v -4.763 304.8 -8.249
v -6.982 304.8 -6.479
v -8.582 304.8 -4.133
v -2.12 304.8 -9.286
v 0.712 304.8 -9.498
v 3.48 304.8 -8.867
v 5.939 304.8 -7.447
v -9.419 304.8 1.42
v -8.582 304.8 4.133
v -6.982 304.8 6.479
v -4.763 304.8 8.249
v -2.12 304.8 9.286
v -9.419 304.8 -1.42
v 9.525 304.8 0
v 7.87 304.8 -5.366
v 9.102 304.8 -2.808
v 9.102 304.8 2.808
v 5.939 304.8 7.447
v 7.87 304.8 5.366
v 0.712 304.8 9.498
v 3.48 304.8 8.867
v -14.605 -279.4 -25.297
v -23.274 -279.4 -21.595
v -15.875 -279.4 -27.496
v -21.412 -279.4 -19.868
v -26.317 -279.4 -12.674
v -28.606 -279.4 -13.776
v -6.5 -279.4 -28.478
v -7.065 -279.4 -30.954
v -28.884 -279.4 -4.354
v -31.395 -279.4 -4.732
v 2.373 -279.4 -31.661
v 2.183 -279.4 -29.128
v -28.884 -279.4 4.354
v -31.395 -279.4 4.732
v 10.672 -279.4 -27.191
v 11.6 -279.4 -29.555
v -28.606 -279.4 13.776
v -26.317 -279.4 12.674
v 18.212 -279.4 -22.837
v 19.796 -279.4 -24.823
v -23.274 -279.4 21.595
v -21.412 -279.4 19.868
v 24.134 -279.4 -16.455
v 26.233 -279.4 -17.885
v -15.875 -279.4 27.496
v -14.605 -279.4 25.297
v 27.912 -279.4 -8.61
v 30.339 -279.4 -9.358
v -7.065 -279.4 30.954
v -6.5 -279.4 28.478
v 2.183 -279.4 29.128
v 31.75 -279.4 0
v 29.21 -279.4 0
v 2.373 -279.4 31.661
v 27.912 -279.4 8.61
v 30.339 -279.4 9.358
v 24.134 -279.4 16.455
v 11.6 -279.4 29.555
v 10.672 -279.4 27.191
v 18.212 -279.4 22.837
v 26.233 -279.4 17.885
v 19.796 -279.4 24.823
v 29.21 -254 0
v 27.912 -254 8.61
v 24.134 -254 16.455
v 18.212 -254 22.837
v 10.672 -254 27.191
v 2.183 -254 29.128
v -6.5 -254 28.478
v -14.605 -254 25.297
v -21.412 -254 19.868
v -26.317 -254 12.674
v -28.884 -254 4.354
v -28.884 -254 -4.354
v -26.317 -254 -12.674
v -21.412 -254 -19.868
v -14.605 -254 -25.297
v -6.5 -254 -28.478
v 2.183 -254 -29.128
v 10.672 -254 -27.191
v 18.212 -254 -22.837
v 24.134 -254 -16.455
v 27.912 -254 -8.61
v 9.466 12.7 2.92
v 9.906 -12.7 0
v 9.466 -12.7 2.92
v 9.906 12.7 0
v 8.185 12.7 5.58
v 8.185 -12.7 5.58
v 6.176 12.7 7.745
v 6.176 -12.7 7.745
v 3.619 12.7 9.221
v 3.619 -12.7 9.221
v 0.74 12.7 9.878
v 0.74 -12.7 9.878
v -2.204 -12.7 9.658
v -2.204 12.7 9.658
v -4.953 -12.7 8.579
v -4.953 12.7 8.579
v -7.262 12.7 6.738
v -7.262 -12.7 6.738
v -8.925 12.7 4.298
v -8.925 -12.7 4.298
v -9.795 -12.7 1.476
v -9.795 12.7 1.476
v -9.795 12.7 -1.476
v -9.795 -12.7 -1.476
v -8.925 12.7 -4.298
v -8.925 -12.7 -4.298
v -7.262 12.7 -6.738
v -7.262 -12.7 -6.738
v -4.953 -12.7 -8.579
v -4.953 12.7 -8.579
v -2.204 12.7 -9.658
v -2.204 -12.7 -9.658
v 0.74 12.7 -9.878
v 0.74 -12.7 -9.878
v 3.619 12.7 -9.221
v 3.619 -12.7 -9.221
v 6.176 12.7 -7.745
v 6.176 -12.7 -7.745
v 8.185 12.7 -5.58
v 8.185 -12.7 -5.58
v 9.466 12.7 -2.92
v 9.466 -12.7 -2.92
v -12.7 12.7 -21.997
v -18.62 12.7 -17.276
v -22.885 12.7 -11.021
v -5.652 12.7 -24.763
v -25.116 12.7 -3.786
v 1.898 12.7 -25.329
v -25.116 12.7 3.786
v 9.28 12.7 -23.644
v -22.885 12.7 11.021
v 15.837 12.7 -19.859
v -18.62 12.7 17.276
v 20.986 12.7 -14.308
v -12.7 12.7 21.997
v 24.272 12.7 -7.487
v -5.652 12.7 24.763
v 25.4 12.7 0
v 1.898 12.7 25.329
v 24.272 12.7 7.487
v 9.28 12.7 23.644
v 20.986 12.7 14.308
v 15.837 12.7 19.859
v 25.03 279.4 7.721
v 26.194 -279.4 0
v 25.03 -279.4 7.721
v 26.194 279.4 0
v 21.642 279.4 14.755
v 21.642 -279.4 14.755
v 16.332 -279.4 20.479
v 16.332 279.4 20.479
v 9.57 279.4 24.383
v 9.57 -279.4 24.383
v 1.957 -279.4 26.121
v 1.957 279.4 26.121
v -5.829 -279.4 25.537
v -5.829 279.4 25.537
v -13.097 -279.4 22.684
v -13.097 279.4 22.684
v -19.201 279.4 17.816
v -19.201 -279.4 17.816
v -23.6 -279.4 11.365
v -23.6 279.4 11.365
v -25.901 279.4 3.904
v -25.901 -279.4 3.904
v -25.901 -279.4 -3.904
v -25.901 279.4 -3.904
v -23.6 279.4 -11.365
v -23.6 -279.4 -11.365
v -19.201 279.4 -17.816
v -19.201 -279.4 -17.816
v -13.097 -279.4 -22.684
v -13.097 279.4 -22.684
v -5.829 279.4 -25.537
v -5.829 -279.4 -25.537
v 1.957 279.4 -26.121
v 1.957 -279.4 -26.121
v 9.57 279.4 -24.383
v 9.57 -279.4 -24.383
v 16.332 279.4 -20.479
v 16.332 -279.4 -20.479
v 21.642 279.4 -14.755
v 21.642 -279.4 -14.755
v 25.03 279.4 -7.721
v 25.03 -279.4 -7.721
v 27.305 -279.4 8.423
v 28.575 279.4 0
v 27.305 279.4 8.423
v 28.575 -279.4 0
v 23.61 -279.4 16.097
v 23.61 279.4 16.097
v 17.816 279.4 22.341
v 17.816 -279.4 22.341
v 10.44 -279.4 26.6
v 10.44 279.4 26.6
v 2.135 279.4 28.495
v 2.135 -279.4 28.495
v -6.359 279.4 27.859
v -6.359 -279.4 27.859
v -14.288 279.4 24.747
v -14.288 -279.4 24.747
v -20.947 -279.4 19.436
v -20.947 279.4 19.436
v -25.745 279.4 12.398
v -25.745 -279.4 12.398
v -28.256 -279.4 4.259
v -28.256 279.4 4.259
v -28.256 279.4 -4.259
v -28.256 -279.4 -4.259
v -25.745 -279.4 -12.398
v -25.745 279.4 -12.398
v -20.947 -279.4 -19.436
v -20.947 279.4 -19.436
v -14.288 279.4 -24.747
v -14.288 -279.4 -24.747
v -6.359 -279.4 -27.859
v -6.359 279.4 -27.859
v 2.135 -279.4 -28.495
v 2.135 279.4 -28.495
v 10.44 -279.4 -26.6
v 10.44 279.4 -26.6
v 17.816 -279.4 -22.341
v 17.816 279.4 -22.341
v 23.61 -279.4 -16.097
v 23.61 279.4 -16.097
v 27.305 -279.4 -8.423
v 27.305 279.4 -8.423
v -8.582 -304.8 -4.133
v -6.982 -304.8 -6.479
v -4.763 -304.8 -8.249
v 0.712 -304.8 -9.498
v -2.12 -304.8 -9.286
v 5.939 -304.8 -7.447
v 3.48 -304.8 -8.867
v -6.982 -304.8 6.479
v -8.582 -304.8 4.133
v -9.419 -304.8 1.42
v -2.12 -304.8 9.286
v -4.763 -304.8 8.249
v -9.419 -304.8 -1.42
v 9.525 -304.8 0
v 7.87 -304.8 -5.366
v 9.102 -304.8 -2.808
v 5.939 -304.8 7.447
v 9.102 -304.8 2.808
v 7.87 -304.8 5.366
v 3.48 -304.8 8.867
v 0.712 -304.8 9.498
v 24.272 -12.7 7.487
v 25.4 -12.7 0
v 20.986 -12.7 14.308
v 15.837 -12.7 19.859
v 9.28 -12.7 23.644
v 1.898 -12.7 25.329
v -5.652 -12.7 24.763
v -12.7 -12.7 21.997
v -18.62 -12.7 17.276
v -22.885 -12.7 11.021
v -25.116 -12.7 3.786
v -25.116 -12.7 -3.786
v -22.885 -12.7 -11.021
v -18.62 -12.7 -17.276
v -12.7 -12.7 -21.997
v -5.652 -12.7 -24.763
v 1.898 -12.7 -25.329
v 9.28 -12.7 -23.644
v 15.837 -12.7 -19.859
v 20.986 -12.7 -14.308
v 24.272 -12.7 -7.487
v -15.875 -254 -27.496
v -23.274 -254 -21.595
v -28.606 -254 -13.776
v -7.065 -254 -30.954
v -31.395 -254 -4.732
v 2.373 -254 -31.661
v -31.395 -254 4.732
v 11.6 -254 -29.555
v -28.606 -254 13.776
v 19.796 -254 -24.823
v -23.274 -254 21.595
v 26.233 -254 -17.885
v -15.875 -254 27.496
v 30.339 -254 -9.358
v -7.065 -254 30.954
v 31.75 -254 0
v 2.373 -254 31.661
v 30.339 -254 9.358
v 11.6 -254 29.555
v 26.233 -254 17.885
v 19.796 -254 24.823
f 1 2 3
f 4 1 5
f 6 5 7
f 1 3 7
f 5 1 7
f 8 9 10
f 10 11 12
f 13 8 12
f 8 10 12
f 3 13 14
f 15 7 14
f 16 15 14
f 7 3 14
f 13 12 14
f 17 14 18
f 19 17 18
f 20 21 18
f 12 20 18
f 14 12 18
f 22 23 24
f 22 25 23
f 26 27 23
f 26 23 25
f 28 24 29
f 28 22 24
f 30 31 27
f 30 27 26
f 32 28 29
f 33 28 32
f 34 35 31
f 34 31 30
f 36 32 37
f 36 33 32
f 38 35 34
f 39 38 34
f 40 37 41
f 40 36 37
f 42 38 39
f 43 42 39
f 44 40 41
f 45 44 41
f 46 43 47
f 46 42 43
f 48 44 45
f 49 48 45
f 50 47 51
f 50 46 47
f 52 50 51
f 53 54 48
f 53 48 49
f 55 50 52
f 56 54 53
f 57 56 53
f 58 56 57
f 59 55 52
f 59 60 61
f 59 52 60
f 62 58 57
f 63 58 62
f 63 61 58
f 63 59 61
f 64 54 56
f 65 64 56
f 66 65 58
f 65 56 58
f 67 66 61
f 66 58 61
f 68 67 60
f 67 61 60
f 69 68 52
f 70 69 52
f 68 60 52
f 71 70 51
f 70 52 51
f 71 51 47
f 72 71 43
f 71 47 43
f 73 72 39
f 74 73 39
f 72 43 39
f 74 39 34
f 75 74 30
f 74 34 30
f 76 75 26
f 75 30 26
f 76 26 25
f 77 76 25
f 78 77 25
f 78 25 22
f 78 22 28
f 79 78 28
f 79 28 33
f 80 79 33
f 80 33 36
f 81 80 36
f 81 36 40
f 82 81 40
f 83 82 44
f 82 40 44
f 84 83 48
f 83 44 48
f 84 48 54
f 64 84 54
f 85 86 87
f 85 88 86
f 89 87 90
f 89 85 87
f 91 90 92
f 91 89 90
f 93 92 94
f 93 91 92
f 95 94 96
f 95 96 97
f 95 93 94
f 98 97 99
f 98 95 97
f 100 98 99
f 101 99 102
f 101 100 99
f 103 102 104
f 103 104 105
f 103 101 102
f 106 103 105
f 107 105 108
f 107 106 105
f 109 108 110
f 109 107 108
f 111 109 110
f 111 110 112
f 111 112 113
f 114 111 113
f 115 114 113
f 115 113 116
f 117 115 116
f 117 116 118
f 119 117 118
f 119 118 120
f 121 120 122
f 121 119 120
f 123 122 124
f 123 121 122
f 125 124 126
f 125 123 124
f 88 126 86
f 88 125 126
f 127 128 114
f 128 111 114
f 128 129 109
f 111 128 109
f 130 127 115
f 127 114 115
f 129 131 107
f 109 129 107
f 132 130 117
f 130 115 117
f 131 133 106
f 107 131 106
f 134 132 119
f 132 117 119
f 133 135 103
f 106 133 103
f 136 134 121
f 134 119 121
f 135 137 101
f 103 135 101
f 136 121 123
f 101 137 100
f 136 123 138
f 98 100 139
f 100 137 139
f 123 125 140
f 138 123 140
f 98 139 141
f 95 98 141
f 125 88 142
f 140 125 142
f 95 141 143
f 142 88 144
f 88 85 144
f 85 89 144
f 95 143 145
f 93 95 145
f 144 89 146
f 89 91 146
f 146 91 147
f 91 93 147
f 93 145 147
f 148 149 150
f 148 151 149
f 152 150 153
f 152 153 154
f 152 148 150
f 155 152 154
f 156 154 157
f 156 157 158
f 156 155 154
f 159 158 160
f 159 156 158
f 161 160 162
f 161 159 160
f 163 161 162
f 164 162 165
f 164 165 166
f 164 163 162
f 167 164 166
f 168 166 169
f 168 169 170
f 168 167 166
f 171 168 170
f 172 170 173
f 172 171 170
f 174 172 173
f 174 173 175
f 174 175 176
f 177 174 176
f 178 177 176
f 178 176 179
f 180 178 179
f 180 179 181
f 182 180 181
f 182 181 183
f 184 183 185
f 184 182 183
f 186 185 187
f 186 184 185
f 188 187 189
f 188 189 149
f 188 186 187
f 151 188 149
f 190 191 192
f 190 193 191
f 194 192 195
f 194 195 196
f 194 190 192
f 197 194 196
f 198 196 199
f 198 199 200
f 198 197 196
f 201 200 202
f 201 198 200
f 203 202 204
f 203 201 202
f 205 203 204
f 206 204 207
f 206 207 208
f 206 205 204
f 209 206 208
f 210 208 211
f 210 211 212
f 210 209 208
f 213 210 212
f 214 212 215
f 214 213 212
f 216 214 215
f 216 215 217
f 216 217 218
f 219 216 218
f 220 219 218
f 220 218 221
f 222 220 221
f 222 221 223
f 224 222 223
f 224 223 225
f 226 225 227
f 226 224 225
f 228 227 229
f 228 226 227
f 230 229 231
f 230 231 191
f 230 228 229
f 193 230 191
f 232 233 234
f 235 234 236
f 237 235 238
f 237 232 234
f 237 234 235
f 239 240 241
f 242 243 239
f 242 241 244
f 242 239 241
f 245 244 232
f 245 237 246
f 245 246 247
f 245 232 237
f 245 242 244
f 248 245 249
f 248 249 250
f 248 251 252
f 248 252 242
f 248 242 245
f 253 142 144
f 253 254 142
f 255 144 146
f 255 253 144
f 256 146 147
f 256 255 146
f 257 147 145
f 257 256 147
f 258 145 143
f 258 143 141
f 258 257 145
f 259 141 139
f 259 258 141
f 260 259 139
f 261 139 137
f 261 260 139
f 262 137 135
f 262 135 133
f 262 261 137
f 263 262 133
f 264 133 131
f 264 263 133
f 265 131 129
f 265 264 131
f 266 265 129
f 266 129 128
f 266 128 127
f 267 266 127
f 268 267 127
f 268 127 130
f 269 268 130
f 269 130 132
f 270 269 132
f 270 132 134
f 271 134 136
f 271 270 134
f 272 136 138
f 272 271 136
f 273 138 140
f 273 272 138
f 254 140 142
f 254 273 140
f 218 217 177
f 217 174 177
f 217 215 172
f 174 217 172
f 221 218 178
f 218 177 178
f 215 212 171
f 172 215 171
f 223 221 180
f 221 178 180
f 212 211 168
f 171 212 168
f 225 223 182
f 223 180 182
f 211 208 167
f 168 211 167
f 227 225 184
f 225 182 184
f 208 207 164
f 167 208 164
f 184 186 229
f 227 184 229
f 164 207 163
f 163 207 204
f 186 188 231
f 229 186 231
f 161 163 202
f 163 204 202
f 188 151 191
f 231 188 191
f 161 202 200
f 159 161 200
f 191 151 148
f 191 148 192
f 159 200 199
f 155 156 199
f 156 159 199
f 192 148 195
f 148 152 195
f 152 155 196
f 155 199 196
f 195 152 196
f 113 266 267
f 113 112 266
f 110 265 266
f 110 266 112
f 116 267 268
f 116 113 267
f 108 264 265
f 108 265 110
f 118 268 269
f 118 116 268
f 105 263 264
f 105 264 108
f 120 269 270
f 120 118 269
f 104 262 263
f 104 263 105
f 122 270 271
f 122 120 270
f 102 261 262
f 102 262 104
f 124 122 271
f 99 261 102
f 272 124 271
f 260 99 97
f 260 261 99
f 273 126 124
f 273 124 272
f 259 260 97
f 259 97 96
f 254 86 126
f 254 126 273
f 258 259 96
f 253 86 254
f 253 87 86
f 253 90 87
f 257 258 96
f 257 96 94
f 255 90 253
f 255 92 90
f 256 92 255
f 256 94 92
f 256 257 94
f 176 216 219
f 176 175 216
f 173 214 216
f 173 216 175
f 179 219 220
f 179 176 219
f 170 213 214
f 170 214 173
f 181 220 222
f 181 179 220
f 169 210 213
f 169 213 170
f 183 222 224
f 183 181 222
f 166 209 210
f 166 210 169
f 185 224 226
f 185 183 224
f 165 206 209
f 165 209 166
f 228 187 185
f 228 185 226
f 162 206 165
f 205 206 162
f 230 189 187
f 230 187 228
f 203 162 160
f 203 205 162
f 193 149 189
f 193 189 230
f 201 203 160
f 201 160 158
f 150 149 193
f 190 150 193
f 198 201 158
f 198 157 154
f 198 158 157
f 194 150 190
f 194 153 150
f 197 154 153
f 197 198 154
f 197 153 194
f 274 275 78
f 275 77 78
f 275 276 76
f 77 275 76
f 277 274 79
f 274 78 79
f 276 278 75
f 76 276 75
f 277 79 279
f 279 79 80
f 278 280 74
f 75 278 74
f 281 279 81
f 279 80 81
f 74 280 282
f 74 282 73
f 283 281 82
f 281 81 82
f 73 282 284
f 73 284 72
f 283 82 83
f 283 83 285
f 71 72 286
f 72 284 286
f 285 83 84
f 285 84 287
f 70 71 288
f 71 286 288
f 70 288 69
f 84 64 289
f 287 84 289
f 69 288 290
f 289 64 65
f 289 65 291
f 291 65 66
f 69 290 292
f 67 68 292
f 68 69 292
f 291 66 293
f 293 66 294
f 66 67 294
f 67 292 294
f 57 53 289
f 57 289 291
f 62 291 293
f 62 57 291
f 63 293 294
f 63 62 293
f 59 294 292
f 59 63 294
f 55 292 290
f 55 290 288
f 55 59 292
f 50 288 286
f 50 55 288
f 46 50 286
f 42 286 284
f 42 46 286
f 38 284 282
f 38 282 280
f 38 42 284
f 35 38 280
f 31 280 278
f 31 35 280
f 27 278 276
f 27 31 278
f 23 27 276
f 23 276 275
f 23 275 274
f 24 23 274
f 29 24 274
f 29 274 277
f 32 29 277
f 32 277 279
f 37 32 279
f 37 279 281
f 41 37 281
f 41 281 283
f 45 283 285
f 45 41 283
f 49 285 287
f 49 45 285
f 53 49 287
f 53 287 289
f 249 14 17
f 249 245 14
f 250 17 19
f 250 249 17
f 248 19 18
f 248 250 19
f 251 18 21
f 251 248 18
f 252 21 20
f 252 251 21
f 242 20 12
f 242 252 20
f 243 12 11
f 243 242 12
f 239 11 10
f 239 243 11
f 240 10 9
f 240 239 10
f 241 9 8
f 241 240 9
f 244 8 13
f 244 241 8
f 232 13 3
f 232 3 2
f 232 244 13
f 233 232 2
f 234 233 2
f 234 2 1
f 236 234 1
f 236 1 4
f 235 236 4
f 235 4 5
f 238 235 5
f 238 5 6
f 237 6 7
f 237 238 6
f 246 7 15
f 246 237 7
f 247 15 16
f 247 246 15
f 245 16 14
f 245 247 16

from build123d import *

# Parameters (mm, degrees)
F0_R     = 9.525
F1_DEPTH = 304.8
F2_R     = 25.4
F2_R_2   = 9.906
F3_DEPTH = 12.7
F4_R     = 28.575
F4_R_2   = 26.19375
F5_DEPTH = 279.4
F6_R     = 31.75
F6_R_2   = 29.21
F7_DEPTH = 25.4


with BuildPart() as f1:
    # F0 (on Front) → F1 (new body, symmetric)
    with BuildSketch(Plane.XZ):
        Circle(F0_R)
    extrude(amount=F1_DEPTH, both=True)


with BuildPart() as f3:
    # F2 (on Front) → F3 (new body, symmetric)
    with BuildSketch(Plane.XZ):
        Circle(F2_R)
        Circle(F2_R_2, mode=Mode.SUBTRACT)
    extrude(amount=F3_DEPTH, both=True)


with BuildPart() as f5:
    # F4 (on Front) → F5 (new body, symmetric)
    with BuildSketch(Plane.XZ):
        Circle(F4_R)
        Circle(F4_R_2, mode=Mode.SUBTRACT)
    extrude(amount=F5_DEPTH, both=True)


with BuildPart() as f7:
    # F6 (on face) → F7 (new body)
    with BuildSketch(Plane.XZ.offset(279.4)):
        Circle(F6_R)
        Circle(F6_R_2, mode=Mode.SUBTRACT)
    extrude(amount=-F7_DEPTH)


solid = Compound([f1.part, f3.part, f5.part, f7.part])
